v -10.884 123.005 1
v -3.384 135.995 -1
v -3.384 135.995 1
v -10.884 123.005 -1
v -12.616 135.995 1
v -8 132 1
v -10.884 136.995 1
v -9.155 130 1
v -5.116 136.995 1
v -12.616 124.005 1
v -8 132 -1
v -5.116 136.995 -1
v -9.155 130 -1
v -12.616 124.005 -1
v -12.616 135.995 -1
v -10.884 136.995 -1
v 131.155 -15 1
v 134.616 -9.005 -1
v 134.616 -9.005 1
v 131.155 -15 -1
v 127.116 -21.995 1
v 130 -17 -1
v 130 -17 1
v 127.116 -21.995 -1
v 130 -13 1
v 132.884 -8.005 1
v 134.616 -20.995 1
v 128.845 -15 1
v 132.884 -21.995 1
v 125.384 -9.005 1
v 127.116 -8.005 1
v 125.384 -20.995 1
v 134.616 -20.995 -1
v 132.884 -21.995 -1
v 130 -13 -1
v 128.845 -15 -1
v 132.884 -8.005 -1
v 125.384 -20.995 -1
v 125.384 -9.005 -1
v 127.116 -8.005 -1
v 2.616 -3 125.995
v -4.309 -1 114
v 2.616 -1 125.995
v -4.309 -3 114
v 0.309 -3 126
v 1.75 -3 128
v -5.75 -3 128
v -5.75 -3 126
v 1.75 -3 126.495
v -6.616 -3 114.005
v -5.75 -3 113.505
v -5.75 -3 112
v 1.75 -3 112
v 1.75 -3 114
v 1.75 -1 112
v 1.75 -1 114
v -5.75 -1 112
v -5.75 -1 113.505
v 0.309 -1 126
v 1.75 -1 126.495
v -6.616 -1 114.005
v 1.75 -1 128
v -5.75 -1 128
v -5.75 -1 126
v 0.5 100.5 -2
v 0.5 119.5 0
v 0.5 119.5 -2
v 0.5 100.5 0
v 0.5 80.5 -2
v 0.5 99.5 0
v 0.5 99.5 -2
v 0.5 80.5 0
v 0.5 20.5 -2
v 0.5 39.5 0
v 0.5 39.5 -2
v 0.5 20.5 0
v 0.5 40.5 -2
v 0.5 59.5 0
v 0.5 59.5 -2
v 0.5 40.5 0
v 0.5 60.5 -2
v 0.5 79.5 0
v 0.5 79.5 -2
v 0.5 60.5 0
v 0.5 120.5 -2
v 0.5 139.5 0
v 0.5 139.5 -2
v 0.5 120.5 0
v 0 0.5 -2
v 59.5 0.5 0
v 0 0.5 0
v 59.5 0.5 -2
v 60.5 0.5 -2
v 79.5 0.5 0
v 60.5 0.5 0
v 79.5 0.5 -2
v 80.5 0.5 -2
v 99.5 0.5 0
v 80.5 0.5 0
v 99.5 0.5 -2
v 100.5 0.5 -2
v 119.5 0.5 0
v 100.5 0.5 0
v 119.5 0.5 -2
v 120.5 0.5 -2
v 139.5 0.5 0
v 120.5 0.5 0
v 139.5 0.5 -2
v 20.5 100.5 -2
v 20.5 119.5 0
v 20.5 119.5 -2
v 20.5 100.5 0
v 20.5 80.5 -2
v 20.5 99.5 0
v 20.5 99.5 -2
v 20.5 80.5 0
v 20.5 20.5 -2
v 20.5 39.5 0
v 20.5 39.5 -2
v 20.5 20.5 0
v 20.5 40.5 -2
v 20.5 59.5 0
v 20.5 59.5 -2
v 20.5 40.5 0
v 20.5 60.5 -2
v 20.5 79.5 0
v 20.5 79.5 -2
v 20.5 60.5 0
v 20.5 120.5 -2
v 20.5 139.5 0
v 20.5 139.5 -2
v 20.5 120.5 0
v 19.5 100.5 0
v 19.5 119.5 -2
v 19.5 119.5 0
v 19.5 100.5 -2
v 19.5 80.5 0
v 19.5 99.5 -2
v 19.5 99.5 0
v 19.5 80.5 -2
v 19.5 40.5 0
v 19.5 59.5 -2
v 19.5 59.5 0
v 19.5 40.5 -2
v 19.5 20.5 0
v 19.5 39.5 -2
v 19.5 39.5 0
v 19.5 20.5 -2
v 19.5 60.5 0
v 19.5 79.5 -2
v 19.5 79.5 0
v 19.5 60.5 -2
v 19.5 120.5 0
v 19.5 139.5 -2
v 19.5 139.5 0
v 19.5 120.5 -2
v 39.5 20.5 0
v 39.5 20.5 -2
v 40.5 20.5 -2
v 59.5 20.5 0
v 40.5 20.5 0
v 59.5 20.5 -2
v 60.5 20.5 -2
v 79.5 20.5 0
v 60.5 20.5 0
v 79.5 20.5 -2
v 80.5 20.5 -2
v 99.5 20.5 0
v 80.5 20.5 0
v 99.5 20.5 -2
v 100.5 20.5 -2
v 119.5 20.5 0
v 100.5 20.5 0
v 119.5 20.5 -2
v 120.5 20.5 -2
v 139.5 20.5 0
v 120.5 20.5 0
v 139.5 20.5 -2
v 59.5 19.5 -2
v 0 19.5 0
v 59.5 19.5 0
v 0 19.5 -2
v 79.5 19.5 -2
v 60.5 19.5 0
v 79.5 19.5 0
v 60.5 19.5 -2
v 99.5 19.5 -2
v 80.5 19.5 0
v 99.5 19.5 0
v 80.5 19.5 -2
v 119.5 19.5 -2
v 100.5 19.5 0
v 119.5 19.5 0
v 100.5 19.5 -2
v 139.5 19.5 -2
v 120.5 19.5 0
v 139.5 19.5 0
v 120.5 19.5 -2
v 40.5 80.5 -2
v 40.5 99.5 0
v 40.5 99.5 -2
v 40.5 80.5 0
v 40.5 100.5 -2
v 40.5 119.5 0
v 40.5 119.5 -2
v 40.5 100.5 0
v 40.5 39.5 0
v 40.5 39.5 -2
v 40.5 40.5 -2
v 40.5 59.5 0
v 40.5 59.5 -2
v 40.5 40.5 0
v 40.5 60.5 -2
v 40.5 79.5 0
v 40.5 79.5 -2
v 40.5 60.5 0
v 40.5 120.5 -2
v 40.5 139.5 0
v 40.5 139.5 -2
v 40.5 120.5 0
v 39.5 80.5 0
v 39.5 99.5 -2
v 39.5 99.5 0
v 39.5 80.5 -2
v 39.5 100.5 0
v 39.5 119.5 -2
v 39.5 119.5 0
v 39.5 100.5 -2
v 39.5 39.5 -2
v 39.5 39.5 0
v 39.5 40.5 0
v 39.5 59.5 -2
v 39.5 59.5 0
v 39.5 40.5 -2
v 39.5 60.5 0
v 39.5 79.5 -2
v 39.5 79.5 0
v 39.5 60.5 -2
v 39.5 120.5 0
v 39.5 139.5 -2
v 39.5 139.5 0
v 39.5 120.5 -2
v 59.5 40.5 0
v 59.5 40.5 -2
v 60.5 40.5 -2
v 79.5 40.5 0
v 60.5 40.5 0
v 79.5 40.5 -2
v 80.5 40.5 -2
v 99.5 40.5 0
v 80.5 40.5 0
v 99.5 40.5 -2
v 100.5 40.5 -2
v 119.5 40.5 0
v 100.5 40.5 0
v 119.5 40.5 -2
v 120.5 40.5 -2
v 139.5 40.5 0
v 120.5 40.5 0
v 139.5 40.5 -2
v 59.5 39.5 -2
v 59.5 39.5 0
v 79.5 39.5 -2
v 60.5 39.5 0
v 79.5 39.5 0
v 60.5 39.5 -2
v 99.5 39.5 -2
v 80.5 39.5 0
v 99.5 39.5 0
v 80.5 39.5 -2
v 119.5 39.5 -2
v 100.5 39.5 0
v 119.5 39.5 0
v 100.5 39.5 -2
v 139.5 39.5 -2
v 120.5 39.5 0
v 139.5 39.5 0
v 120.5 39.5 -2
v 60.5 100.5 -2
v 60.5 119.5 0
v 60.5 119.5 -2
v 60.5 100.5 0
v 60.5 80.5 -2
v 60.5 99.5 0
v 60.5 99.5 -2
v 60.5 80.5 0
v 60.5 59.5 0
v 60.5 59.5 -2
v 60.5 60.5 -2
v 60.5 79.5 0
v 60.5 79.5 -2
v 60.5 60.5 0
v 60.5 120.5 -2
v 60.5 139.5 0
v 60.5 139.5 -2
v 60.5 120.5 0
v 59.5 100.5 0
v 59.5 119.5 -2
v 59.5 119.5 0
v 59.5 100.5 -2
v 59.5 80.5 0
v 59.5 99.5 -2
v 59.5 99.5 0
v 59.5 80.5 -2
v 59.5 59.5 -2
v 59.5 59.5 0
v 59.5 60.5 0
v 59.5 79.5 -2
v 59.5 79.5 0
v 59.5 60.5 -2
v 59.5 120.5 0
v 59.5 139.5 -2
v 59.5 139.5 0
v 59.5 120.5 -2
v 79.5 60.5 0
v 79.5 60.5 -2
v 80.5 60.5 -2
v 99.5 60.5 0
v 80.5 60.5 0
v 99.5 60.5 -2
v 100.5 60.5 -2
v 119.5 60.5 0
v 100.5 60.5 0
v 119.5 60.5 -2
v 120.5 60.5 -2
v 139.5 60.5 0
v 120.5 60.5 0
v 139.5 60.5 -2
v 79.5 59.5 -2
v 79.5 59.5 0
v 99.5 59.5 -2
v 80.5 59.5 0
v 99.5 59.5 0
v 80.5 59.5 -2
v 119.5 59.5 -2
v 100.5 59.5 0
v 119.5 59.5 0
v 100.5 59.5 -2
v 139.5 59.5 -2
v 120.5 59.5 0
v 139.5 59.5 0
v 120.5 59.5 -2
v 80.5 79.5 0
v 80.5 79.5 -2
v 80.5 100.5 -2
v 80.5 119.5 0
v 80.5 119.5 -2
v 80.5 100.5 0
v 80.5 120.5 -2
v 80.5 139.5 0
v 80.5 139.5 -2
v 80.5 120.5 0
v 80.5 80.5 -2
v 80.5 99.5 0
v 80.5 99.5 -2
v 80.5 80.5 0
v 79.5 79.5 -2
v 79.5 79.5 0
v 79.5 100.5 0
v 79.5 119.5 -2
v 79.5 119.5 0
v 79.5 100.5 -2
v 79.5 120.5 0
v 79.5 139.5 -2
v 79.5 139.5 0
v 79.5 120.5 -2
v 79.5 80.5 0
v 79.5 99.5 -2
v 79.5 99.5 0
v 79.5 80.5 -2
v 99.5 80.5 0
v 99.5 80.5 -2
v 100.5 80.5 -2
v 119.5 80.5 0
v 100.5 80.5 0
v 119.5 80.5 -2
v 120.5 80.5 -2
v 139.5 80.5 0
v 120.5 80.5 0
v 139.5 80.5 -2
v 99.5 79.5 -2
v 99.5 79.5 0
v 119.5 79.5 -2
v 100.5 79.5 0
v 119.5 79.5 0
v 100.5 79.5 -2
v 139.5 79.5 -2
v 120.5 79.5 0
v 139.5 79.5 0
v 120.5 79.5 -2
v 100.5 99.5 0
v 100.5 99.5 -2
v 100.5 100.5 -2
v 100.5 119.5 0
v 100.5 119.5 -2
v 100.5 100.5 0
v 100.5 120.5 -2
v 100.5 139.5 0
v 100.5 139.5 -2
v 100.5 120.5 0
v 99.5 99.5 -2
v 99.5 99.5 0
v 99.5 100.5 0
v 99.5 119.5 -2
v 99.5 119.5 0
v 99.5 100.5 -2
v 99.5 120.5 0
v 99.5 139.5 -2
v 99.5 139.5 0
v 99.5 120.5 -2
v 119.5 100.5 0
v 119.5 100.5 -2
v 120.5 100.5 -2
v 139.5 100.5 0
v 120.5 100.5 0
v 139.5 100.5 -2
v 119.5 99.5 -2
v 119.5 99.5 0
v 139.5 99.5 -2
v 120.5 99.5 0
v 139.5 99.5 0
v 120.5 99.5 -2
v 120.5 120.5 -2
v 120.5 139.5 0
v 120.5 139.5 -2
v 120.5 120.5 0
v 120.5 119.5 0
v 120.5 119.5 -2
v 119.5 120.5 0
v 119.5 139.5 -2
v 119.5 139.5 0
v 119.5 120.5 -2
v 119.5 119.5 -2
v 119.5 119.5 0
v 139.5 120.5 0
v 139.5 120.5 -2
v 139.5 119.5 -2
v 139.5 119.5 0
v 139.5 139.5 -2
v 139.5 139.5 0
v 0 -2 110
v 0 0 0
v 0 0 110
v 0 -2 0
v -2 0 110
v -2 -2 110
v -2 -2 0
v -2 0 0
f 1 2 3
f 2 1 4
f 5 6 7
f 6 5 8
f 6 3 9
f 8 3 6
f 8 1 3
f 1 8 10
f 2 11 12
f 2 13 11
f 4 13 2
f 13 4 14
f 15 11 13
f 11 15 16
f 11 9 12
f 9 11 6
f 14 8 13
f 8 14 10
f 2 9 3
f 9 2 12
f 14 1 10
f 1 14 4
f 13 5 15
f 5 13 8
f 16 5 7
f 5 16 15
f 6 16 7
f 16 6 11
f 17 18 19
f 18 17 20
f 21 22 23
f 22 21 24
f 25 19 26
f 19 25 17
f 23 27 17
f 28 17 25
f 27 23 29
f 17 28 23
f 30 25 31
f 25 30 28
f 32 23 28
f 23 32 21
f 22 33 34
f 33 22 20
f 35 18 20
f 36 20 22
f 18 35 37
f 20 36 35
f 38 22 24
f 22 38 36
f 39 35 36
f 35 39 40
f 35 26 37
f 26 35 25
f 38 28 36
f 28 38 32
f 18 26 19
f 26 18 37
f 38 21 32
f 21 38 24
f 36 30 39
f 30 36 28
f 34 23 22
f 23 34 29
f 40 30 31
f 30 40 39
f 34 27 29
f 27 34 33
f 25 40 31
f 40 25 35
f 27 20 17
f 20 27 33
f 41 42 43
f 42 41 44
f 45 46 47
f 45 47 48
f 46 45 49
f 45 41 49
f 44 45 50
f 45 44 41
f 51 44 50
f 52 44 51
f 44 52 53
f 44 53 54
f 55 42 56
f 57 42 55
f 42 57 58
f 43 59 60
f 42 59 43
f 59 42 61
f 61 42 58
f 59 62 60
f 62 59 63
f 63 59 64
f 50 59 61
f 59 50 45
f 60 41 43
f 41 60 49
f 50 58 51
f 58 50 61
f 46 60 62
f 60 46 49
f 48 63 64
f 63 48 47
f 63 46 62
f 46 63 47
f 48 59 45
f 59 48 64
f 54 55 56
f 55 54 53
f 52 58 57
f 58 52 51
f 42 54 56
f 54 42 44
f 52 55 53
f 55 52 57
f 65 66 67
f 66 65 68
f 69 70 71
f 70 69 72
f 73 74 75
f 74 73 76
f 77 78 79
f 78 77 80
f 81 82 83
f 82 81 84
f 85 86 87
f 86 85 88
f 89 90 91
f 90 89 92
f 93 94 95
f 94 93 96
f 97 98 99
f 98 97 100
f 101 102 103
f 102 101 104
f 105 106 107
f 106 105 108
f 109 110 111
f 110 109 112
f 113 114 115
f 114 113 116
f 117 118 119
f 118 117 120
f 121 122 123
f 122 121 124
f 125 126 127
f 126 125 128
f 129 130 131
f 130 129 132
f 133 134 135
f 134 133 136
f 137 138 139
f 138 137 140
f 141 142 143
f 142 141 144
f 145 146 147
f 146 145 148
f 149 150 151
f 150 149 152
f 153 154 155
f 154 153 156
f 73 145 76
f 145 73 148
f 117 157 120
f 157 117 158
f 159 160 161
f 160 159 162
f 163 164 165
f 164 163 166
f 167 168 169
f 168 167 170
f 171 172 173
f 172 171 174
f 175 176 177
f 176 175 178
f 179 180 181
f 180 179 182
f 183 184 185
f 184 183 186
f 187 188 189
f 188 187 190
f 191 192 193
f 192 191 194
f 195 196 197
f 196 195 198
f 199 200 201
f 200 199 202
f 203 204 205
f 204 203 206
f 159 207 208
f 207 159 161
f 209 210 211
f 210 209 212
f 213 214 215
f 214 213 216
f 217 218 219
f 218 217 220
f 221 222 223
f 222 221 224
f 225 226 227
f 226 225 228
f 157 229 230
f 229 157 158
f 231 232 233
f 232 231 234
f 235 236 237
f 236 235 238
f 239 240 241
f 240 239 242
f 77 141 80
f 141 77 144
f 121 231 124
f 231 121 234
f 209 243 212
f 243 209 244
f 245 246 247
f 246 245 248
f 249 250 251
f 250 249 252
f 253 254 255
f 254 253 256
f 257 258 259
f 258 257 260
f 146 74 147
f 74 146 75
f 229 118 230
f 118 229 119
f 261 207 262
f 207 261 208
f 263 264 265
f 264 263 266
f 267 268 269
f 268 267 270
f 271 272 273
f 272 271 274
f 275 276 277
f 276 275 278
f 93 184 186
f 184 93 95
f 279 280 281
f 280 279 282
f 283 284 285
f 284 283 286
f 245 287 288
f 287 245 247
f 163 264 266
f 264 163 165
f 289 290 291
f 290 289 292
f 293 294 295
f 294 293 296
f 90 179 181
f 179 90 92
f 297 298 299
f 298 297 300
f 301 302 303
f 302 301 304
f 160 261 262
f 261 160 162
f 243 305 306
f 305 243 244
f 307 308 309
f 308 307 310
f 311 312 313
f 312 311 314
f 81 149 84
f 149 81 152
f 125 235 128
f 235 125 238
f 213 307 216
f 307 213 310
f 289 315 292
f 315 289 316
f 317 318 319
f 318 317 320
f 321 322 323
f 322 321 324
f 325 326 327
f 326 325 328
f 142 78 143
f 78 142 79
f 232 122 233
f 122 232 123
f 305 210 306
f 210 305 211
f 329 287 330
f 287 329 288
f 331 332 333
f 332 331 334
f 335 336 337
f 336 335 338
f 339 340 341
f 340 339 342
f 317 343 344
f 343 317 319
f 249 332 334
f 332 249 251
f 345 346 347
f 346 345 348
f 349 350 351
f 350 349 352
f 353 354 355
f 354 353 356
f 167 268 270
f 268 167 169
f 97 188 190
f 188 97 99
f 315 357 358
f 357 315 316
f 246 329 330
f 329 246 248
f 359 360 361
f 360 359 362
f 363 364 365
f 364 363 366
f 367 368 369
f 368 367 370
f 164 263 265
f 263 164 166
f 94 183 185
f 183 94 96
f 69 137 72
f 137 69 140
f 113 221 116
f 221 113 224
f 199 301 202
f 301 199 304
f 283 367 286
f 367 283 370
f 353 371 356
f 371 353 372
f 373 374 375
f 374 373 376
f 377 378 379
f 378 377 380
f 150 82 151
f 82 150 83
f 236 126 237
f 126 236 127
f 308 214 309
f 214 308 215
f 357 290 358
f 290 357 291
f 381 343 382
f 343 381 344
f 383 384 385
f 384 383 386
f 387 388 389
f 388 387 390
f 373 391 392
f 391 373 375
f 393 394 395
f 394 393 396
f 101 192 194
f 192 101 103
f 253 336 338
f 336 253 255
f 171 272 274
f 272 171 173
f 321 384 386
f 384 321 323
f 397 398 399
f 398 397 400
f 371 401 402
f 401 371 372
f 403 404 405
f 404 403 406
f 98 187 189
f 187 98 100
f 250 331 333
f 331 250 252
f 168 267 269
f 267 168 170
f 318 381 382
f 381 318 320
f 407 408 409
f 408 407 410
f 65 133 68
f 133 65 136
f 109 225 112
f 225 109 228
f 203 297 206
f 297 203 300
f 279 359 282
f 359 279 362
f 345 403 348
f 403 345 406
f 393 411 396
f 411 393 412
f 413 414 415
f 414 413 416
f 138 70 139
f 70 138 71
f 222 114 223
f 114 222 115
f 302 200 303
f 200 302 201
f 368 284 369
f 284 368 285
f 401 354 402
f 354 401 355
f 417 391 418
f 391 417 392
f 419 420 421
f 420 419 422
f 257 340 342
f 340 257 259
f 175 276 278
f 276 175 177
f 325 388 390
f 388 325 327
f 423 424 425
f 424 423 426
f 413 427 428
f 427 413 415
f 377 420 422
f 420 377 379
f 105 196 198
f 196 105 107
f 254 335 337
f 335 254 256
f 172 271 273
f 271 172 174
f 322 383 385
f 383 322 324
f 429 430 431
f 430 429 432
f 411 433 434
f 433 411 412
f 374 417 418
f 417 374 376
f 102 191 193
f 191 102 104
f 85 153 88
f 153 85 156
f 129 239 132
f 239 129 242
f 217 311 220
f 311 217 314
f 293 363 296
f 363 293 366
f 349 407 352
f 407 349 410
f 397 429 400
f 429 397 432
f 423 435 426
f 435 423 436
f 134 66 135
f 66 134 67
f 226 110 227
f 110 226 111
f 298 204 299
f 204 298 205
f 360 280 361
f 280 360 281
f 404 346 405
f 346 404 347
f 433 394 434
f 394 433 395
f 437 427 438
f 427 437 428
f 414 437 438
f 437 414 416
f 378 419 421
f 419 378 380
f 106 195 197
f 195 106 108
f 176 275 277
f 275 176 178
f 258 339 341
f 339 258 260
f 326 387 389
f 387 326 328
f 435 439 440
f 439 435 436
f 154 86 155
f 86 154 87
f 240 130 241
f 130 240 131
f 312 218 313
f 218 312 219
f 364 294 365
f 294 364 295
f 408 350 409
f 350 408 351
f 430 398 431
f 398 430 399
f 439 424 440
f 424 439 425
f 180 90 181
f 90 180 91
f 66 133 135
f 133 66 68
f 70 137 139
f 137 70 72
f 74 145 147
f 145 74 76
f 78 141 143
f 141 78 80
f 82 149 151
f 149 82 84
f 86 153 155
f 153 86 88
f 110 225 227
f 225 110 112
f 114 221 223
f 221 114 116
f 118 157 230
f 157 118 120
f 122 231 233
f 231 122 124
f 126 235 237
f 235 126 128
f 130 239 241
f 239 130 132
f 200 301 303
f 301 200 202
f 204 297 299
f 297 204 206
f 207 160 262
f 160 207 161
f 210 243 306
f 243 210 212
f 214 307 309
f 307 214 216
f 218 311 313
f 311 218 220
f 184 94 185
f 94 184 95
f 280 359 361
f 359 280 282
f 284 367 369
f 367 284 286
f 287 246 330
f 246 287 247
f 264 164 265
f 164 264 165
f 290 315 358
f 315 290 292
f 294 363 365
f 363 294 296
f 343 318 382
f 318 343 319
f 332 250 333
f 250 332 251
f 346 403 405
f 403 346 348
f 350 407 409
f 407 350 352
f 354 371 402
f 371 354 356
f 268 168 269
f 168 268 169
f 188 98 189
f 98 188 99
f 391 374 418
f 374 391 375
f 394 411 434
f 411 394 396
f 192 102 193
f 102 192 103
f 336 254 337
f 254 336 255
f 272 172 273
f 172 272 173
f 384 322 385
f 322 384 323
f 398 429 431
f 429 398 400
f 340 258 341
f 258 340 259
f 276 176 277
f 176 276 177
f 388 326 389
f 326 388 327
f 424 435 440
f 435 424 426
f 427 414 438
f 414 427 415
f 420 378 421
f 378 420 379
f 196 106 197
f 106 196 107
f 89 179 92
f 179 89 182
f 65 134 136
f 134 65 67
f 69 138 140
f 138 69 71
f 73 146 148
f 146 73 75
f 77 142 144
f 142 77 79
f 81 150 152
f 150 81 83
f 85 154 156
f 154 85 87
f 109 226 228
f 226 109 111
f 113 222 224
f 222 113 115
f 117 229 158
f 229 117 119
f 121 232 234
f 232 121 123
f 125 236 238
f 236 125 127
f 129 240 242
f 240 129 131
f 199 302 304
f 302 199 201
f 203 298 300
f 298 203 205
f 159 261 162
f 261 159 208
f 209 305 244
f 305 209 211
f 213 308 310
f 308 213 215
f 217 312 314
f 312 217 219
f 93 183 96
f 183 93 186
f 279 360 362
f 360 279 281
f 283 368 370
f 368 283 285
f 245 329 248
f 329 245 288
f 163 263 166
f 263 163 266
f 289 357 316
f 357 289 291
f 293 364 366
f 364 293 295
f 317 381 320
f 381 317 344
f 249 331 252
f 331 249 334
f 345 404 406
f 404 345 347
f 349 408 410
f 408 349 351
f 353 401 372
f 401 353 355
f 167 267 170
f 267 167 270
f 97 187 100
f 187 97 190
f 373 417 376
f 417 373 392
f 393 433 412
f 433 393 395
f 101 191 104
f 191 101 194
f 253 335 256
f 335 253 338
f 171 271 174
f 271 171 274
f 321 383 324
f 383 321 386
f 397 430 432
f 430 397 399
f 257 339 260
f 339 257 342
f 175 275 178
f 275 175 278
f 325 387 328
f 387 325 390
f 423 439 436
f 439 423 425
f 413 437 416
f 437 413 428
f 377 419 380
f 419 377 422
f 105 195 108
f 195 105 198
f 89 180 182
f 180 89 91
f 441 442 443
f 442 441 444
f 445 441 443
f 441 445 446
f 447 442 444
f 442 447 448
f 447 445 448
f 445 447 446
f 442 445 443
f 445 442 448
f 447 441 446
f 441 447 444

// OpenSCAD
/*

  OpenSCAD file for generating STL models of RepRap build bases for display in the 
  RepRap Java Host software.

  Adrian Bowyer 27 November 2011

  Licence: GPL

*/

// Uncomment the next line for Mendel
//reprap_base(x=200, y=200, z=120);

//Uncomment the next line for Huxley
reprap_base(x=140, y=140, z=110);

module logo()
{
	linear_extrude(file = "reprap-logo.dxf", layer = "Layer_1", origin = [7,267.5],  scale = 0.3, height = 10, 
		center = true, convexity = 50, twist = 0 );
}

module x()
{
	union()
	{
		rotate([0,0,-30])
			cube([2,15,2], center=true);
		rotate([0,0,30])
			cube([2,15,2], center=true);
	}
}

module y()
{
	union()
	{
		rotate([0,0,-30])
			cube([2,15,2], center=true);
		rotate([0,0,30])
			translate([0,3.75,0])
				cube([2,7.5,2], center=true);
	}
}

module z()
{
	union()
	{
		rotate([0,0,-30])
			cube([2,15,2], center=true);
		translate([0,7,0])
			cube([7.5,2,2], center=true);
		translate([0,-7,0])
			cube([7.5,2,2], center=true);
	}
}


module reprap_base(x=140, y=140, z=110)
{
	union()
	{
		translate([-8,y-10,0])
			y();
	
		translate([x-10,-15,0])
			x();
	
		translate([-2,-2,z+10])
			rotate([90,0,0])
				z();
		
		difference()
		{
			translate([0,0,-2])
				cube([x,y,2]);
			
			translate([8,6.5,0])
				logo();
			
			for ( i = [0 : 1+floor(max(x/20, y/20))] )
			{
				if(i < 3)
				{
					translate([i*20-0.5,20,-10])
						cube([1,400,20]);
				} else
				{
					translate([i*20-0.5,-10,-10])
						cube([1,400,20]);
				}
				translate([-10,i*20-0.5,-10])
					cube([400,1,20]);
			}
		}
		
		translate([-2,-2,0])
		cube([2,2,z]);
	}
}
